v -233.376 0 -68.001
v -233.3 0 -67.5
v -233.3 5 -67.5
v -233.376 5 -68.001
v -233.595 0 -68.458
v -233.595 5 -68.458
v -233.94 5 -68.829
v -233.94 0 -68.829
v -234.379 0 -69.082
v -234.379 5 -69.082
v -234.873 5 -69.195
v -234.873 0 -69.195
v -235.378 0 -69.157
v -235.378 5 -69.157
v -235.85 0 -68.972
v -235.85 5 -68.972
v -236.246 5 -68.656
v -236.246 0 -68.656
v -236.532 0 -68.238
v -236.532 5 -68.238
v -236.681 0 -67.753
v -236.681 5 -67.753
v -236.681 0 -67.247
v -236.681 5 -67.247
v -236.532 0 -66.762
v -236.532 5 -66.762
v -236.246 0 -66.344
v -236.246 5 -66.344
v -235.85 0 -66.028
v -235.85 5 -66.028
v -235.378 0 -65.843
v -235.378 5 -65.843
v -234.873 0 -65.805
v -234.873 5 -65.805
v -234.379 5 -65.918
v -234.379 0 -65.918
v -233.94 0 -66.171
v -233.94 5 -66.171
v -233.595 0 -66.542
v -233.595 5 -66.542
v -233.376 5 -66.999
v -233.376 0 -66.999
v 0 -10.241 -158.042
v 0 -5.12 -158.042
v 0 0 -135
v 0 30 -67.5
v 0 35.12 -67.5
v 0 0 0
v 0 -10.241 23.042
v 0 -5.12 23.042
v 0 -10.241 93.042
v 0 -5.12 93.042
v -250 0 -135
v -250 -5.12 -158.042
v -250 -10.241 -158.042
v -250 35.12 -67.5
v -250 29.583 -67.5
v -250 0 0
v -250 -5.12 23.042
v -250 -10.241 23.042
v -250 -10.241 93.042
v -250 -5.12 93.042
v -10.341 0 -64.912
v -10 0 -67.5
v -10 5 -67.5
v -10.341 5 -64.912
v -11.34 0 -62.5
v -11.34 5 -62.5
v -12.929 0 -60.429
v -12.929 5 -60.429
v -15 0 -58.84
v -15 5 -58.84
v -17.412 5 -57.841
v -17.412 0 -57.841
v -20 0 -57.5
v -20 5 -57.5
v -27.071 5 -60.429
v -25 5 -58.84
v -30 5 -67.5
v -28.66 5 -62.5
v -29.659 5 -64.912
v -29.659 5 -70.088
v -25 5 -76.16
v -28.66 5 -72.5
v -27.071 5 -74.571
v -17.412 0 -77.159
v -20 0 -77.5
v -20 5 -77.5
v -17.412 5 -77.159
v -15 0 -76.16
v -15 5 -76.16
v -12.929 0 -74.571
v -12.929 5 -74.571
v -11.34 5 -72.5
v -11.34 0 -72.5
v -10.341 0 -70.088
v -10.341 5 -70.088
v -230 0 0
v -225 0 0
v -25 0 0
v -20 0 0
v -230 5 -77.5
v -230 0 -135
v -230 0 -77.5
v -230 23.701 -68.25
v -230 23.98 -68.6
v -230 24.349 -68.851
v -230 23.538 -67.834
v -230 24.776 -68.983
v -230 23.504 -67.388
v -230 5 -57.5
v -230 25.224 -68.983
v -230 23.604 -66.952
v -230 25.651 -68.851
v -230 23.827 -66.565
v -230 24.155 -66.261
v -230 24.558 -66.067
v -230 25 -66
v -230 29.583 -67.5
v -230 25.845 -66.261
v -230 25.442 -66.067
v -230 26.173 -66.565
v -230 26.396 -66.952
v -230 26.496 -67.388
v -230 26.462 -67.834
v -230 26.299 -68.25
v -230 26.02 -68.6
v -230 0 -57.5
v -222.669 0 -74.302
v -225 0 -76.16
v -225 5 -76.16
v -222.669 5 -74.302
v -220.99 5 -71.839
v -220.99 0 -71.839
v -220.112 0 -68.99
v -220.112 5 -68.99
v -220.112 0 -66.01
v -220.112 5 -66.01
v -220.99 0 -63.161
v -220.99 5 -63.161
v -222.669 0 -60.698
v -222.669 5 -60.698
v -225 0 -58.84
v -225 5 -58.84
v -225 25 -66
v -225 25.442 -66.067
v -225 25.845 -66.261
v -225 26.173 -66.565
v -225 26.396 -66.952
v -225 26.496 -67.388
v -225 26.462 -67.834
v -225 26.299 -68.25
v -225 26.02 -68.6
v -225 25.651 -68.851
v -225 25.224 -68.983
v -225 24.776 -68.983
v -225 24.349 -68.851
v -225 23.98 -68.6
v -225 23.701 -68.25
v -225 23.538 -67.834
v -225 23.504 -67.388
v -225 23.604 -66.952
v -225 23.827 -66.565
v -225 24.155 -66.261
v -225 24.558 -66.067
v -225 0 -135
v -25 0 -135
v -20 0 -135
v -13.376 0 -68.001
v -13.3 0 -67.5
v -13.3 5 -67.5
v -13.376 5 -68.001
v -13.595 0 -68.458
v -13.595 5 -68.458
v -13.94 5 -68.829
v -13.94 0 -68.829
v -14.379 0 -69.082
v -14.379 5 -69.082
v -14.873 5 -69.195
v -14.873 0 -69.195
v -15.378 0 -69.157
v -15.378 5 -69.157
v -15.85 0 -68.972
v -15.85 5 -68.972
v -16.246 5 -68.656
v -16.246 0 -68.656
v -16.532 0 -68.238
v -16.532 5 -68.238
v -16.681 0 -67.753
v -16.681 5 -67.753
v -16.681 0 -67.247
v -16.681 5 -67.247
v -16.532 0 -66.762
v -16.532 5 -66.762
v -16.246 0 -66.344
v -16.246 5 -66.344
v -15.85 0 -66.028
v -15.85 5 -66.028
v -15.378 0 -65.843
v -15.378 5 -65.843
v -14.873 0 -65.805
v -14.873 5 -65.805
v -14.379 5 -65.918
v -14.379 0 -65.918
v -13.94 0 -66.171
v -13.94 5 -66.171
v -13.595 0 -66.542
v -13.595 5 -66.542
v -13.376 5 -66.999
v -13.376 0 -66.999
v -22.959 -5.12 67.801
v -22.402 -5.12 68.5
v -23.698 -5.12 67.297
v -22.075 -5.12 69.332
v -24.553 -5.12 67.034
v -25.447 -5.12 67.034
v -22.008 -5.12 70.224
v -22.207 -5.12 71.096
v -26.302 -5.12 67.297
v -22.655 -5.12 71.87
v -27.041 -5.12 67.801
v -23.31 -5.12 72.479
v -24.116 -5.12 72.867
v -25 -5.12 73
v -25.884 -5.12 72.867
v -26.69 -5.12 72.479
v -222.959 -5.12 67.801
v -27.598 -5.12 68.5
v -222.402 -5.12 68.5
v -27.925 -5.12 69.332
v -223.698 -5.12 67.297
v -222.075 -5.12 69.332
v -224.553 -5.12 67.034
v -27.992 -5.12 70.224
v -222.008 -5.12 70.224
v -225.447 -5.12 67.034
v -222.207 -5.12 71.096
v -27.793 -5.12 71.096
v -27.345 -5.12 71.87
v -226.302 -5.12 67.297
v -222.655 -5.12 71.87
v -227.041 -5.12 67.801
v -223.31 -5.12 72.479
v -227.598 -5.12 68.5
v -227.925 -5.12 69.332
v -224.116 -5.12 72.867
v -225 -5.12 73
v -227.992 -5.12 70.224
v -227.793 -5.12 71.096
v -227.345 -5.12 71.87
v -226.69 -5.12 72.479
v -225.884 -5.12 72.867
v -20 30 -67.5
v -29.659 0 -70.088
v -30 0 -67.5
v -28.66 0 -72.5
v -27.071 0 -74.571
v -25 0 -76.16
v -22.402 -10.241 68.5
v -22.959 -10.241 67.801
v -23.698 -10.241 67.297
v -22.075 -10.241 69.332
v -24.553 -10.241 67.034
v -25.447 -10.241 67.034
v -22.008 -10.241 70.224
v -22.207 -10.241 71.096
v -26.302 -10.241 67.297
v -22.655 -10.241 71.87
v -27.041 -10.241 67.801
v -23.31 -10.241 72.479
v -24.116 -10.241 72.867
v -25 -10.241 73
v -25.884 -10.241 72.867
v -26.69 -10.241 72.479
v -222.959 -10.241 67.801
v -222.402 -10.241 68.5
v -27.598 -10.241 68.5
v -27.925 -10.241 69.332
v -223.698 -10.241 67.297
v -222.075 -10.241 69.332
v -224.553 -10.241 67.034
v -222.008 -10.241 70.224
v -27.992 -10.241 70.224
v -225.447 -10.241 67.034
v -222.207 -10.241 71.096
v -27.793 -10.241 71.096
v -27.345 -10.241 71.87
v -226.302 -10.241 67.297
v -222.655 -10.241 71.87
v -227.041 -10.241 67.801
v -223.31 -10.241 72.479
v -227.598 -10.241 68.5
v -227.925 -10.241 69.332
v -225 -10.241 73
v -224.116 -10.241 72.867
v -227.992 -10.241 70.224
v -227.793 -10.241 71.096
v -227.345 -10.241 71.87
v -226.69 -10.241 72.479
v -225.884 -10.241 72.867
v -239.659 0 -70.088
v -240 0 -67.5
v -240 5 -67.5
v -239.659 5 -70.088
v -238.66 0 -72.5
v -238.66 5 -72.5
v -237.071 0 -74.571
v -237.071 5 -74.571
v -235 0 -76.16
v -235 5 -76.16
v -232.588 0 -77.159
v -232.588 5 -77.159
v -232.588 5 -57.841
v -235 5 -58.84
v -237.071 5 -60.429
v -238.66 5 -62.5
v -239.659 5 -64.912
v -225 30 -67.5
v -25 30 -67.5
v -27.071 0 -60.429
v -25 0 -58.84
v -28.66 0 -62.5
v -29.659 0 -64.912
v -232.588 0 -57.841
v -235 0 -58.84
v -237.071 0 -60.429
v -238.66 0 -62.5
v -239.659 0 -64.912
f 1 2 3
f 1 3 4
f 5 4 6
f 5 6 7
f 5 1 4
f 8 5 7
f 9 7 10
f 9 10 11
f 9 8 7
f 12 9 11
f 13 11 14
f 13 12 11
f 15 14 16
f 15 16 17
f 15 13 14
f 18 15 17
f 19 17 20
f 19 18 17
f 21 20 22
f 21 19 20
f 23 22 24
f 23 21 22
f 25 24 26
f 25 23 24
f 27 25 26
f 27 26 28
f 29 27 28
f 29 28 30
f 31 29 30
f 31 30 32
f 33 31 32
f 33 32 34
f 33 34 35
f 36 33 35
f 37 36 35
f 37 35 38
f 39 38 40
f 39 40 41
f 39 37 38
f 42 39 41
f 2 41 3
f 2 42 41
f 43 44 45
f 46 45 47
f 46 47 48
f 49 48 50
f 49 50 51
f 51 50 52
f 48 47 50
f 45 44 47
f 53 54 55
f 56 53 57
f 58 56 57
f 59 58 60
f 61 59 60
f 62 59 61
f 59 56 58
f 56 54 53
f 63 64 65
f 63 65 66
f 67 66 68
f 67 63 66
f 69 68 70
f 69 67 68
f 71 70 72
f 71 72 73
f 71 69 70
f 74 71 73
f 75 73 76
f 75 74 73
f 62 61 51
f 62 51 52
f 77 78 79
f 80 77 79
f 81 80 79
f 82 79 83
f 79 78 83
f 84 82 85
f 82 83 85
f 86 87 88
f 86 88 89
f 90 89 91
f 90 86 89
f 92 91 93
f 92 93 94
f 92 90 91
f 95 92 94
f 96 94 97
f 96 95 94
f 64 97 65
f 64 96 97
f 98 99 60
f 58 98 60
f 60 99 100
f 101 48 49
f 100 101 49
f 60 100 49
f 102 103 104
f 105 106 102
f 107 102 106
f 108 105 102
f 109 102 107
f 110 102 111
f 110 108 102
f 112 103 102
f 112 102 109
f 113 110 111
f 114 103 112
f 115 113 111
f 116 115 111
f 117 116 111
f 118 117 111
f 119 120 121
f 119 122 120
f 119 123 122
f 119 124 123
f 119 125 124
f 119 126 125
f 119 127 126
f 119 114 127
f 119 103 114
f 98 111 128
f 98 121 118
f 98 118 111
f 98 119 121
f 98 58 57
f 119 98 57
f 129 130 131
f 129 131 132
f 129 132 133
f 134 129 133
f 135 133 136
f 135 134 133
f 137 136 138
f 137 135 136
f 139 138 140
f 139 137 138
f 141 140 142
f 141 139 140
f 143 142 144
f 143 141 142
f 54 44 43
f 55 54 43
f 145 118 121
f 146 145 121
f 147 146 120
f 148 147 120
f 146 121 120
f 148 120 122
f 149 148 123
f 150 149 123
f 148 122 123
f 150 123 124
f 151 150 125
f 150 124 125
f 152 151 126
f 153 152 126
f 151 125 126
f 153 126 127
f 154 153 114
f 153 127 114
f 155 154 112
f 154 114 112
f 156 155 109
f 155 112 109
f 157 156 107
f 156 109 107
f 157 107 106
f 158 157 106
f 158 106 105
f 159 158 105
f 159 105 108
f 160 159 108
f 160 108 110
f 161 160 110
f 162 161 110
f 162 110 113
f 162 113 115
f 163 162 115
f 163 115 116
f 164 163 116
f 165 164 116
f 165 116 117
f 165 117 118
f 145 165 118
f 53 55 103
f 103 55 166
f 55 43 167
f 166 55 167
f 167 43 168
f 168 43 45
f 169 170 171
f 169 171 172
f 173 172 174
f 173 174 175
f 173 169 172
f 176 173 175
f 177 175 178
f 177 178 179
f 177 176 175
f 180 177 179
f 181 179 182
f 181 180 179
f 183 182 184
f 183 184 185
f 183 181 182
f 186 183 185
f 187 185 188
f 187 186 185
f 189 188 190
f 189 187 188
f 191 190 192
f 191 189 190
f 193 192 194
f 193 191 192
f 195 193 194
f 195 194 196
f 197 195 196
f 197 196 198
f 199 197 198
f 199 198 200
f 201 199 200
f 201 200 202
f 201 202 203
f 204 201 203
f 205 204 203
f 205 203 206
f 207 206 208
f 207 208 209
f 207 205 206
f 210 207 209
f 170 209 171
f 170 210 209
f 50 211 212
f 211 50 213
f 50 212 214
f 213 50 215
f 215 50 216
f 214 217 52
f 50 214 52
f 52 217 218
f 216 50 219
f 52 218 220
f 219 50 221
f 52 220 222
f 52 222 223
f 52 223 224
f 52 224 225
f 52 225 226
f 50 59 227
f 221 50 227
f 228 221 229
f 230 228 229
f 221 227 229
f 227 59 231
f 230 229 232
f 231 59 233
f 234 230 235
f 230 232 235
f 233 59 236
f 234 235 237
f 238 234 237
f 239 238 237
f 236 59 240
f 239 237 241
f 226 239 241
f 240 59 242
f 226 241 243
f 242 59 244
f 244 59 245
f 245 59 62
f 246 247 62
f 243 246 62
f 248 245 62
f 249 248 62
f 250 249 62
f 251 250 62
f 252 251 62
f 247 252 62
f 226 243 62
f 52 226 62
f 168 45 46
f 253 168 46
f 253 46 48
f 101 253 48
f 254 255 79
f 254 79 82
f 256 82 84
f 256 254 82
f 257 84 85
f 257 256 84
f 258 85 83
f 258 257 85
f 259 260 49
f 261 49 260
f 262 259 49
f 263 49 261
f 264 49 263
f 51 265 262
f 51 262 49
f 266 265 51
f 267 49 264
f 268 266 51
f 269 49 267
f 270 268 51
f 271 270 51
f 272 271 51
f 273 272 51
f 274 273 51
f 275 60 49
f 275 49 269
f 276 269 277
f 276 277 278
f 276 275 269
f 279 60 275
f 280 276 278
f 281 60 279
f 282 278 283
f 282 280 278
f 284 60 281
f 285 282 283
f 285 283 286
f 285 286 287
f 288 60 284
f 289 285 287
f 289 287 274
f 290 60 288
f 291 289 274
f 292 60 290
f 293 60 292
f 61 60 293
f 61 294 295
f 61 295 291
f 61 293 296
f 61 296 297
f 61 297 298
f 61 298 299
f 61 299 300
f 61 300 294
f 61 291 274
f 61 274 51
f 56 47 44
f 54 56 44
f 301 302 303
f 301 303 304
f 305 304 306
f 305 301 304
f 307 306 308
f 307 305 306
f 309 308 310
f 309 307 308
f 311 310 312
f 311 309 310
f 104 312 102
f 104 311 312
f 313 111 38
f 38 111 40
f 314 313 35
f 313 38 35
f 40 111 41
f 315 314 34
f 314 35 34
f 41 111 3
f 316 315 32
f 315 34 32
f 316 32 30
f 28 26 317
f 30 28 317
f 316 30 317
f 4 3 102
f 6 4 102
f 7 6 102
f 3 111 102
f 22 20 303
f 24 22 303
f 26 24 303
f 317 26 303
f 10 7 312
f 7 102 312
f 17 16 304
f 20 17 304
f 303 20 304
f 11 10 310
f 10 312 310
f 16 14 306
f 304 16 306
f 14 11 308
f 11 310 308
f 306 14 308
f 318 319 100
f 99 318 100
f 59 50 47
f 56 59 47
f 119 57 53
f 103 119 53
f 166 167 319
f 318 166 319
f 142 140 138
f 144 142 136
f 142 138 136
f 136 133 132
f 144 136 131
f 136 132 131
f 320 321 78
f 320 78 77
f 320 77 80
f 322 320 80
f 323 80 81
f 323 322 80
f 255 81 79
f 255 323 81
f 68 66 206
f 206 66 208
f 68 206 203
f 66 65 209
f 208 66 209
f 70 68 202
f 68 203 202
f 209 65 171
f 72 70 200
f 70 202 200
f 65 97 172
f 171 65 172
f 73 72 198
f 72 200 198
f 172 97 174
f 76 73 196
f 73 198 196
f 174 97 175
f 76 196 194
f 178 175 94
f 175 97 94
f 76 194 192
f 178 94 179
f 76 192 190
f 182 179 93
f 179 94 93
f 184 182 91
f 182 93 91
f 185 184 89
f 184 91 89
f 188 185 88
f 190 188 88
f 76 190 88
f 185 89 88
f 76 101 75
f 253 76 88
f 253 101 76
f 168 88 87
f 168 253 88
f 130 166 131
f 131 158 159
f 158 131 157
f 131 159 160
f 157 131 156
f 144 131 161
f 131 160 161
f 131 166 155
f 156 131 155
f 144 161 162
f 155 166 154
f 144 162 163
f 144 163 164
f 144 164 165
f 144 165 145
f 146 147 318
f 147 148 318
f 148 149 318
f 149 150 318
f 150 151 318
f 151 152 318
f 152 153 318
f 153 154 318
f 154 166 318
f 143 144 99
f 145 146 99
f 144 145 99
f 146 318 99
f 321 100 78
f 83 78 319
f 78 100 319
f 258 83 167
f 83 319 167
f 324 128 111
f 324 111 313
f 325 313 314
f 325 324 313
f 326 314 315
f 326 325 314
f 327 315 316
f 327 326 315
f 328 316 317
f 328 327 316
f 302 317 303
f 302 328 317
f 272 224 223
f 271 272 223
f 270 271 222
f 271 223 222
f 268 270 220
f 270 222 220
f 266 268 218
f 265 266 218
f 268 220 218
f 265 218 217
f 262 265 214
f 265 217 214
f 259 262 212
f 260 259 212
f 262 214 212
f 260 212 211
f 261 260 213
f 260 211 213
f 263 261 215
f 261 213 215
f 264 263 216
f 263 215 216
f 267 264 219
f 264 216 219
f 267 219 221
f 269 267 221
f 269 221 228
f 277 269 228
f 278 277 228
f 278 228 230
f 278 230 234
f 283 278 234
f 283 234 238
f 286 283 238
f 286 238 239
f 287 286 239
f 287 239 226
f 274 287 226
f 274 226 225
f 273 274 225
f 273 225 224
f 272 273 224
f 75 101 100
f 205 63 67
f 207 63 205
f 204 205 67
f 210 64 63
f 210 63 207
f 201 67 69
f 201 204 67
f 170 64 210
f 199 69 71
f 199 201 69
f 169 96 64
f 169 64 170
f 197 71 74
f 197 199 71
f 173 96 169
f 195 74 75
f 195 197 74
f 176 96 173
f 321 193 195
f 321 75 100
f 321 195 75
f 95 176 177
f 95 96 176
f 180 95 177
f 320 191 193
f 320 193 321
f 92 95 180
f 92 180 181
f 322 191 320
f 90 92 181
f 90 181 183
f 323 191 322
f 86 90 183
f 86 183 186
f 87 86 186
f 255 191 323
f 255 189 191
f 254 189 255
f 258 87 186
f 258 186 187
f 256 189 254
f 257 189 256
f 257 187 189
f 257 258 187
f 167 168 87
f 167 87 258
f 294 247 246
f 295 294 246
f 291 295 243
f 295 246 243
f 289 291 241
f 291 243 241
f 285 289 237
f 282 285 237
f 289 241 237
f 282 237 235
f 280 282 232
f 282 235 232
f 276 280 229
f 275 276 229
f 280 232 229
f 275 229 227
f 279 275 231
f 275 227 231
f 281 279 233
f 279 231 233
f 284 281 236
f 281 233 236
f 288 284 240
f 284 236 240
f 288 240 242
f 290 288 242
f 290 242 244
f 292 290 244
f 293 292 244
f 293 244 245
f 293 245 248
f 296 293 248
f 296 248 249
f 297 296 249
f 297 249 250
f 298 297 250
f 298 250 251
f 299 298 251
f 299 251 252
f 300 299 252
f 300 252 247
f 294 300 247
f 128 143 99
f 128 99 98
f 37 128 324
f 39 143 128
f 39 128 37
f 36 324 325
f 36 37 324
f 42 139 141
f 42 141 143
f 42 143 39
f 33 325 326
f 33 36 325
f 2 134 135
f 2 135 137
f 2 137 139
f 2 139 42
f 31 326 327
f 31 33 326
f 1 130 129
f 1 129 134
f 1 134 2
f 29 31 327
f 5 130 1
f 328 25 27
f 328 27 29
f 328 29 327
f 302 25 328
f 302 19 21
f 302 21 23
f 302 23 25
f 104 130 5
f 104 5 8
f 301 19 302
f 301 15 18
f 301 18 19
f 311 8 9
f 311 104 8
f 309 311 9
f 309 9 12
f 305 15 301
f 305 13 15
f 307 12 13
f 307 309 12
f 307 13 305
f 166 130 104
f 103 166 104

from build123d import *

# Parameters (mm, degrees)
BOSS_EXTRUDE1_DEPTH = 250
BOSS_EXTRUDE2_DEPTH = 25
CUT_EXTRUDE1_DEPTH  = 20
BOSS_EXTRUDE3_DEPTH = 25
CUT_EXTRUDE2_DEPTH  = 20
BOSS_EXTRUDE4_DEPTH = 5
BOSS_EXTRUDE5_DEPTH = 5
SKETCH8_R           = 1.5
CUT_EXTRUDE3_DEPTH  = 10
SKETCH9_W           = 70
SKETCH9_H           = 5.120472302
BOSS_EXTRUDE7_DEPTH = 250
SKETCH11_R          = 3
CUT_EXTRUDE4_DEPTH  = 90


with BuildPart() as part:
    # Sketch1 → Boss-Extrude1 (new body)
    with BuildSketch(Plane(origin=(0, 0, 0), x_dir=(0, 0, -1), z_dir=(1, 0, 0))):
        Polygon((-23.04212536, -5.120472302), (67.5, 35.120472302), (158.04212536, -5.120472302), (158.04212536, -10.240944604), (135, 0), (67.5, 30), (0, 0), (-23.04212536, -10.240944604), align=None)
    extrude(amount=-BOSS_EXTRUDE1_DEPTH)

    # Sketch2 → Boss-Extrude2 (add)
    with BuildSketch(Plane(origin=(0, 0, 0), x_dir=(0, 0, -1), z_dir=(1, 0, 0))):
        Polygon((0, 0), (135, 0), (67.5, 30), align=None)
    extrude(amount=-BOSS_EXTRUDE2_DEPTH)

    # Sketch3 → Cut-Extrude1 (cut)
    with BuildSketch(Plane(origin=(0, 0, 0), x_dir=(0, 0, -1), z_dir=(1, 0, 0))):
        Polygon((0, 0), (135, 0), (67.5, 30), align=None)
    extrude(amount=-CUT_EXTRUDE1_DEPTH, mode=Mode.SUBTRACT)

    # Sketch4 → Boss-Extrude3 (add)
    with BuildSketch(Plane.ZY.offset(250)):
        Polygon((-135, 0), (0, 0), (-67.5, 30), align=None)
    extrude(amount=-BOSS_EXTRUDE3_DEPTH)

    # Sketch5 → Cut-Extrude2 (cut)
    with BuildSketch(Plane.ZY.offset(250)):
        Polygon((-135, 0), (0, 0), (-67.5, 29.582678365), align=None)
    extrude(amount=-CUT_EXTRUDE2_DEPTH, mode=Mode.SUBTRACT)

    # Sketch6 → Boss-Extrude4 (add)
    with BuildSketch(Plane(origin=(0, 0, 0), x_dir=(-1, 0, 0), z_dir=(0, -1, 0))):
        with BuildLine():
            ThreePointArc((233.3, 67.5), (235, 69.2), (236.7, 67.5))
            Line((236.7, 67.5), (240, 67.5))
            ThreePointArc((240, 67.5), (237.071067812, 74.571067812), (230, 77.5))
            Line((230, 77.5), (230, 67.5))
            Line((230, 67.5), (233.3, 67.5))
        make_face()
        with BuildLine():
            Line((240, 67.5), (236.7, 67.5))
            ThreePointArc((236.7, 67.5), (235, 65.8), (233.3, 67.5))
            Line((233.3, 67.5), (230, 67.5))
            Line((230, 67.5), (230, 57.5))
            ThreePointArc((230, 57.5), (237.071067812, 60.428932188), (240, 67.5))
        make_face()
        with BuildLine():
            Line((225, 58.839745962), (225, 76.160254038))
            ThreePointArc((225, 76.160254038), (220, 67.5), (225, 58.839745962))
        make_face()
        with BuildLine():
            Line((230, 67.5), (230, 77.5))
            ThreePointArc((230, 77.5), (227.411809549, 77.159258263), (225, 76.160254038))
            Line((225, 76.160254038), (225, 58.839745962))
            ThreePointArc((225, 58.839745962), (227.411809549, 57.840741737), (230, 57.5))
            Line((230, 57.5), (230, 67.5))
        make_face()
    extrude(amount=-BOSS_EXTRUDE4_DEPTH)

    # Sketch7 → Boss-Extrude5 (add)
    with BuildSketch(Plane(origin=(0, 0, 0), x_dir=(-1, 0, 0), z_dir=(0, -1, 0))):
        with BuildLine():
            Line((20, 57.5), (20, 67.5))
            Line((20, 67.5), (16.7, 67.5))
            ThreePointArc((16.7, 67.5), (15, 65.8), (13.3, 67.5))
            Line((13.3, 67.5), (10, 67.5))
            ThreePointArc((10, 67.5), (12.928932188, 60.428932188), (20, 57.5))
        make_face()
        with BuildLine():
            Line((16.7, 67.5), (20, 67.5))
            Line((20, 67.5), (20, 77.5))
            ThreePointArc((20, 77.5), (12.928932188, 74.571067812), (10, 67.5))
            Line((10, 67.5), (13.3, 67.5))
            ThreePointArc((13.3, 67.5), (15, 69.2), (16.7, 67.5))
        make_face()
        with BuildLine():
            Line((20, 77.5), (20, 67.5))
            Line((20, 67.5), (20, 57.5))
            ThreePointArc((20, 57.5), (22.588190451, 57.840741737), (25, 58.839745962))
            Line((25, 58.839745962), (25, 76.160254038))
            ThreePointArc((25, 76.160254038), (22.588190451, 77.159258263), (20, 77.5))
        make_face()
        with BuildLine():
            ThreePointArc((30, 67.5), (28.660254038, 72.5), (25, 76.160254038))
            Line((25, 76.160254038), (25, 58.839745962))
            ThreePointArc((25, 58.839745962), (28.660254038, 62.5), (30, 67.5))
        make_face()
    extrude(amount=-BOSS_EXTRUDE5_DEPTH)

    # Sketch8 → Cut-Extrude3 (cut)
    with BuildSketch(Plane.ZY.offset(230)):
        with Locations((-67.5, 25)):
            Circle(SKETCH8_R)
    extrude(amount=-CUT_EXTRUDE3_DEPTH, mode=Mode.SUBTRACT)

    # Sketch9 → Boss-Extrude7 (add)
    with BuildSketch(Plane.ZY.offset(250)):
        with Locations((58.04212536, -7.680708453)):
            Rectangle(SKETCH9_W, SKETCH9_H)
    extrude(amount=-BOSS_EXTRUDE7_DEPTH)

    # Sketch11 → Cut-Extrude4 (cut)
    with BuildSketch(Plane(origin=(0, -5.120472302, 0), x_dir=(1, 0, 0), z_dir=(0, 1, 0))):
        with Locations(Location((-225, -70, 0), (0, 0, 270))):
            Circle(SKETCH11_R)
        with Locations(Location((-25, -70, 0), (0, 0, 270))):
            Circle(SKETCH11_R)
    extrude(amount=-CUT_EXTRUDE4_DEPTH, mode=Mode.SUBTRACT)


solid = part.part
